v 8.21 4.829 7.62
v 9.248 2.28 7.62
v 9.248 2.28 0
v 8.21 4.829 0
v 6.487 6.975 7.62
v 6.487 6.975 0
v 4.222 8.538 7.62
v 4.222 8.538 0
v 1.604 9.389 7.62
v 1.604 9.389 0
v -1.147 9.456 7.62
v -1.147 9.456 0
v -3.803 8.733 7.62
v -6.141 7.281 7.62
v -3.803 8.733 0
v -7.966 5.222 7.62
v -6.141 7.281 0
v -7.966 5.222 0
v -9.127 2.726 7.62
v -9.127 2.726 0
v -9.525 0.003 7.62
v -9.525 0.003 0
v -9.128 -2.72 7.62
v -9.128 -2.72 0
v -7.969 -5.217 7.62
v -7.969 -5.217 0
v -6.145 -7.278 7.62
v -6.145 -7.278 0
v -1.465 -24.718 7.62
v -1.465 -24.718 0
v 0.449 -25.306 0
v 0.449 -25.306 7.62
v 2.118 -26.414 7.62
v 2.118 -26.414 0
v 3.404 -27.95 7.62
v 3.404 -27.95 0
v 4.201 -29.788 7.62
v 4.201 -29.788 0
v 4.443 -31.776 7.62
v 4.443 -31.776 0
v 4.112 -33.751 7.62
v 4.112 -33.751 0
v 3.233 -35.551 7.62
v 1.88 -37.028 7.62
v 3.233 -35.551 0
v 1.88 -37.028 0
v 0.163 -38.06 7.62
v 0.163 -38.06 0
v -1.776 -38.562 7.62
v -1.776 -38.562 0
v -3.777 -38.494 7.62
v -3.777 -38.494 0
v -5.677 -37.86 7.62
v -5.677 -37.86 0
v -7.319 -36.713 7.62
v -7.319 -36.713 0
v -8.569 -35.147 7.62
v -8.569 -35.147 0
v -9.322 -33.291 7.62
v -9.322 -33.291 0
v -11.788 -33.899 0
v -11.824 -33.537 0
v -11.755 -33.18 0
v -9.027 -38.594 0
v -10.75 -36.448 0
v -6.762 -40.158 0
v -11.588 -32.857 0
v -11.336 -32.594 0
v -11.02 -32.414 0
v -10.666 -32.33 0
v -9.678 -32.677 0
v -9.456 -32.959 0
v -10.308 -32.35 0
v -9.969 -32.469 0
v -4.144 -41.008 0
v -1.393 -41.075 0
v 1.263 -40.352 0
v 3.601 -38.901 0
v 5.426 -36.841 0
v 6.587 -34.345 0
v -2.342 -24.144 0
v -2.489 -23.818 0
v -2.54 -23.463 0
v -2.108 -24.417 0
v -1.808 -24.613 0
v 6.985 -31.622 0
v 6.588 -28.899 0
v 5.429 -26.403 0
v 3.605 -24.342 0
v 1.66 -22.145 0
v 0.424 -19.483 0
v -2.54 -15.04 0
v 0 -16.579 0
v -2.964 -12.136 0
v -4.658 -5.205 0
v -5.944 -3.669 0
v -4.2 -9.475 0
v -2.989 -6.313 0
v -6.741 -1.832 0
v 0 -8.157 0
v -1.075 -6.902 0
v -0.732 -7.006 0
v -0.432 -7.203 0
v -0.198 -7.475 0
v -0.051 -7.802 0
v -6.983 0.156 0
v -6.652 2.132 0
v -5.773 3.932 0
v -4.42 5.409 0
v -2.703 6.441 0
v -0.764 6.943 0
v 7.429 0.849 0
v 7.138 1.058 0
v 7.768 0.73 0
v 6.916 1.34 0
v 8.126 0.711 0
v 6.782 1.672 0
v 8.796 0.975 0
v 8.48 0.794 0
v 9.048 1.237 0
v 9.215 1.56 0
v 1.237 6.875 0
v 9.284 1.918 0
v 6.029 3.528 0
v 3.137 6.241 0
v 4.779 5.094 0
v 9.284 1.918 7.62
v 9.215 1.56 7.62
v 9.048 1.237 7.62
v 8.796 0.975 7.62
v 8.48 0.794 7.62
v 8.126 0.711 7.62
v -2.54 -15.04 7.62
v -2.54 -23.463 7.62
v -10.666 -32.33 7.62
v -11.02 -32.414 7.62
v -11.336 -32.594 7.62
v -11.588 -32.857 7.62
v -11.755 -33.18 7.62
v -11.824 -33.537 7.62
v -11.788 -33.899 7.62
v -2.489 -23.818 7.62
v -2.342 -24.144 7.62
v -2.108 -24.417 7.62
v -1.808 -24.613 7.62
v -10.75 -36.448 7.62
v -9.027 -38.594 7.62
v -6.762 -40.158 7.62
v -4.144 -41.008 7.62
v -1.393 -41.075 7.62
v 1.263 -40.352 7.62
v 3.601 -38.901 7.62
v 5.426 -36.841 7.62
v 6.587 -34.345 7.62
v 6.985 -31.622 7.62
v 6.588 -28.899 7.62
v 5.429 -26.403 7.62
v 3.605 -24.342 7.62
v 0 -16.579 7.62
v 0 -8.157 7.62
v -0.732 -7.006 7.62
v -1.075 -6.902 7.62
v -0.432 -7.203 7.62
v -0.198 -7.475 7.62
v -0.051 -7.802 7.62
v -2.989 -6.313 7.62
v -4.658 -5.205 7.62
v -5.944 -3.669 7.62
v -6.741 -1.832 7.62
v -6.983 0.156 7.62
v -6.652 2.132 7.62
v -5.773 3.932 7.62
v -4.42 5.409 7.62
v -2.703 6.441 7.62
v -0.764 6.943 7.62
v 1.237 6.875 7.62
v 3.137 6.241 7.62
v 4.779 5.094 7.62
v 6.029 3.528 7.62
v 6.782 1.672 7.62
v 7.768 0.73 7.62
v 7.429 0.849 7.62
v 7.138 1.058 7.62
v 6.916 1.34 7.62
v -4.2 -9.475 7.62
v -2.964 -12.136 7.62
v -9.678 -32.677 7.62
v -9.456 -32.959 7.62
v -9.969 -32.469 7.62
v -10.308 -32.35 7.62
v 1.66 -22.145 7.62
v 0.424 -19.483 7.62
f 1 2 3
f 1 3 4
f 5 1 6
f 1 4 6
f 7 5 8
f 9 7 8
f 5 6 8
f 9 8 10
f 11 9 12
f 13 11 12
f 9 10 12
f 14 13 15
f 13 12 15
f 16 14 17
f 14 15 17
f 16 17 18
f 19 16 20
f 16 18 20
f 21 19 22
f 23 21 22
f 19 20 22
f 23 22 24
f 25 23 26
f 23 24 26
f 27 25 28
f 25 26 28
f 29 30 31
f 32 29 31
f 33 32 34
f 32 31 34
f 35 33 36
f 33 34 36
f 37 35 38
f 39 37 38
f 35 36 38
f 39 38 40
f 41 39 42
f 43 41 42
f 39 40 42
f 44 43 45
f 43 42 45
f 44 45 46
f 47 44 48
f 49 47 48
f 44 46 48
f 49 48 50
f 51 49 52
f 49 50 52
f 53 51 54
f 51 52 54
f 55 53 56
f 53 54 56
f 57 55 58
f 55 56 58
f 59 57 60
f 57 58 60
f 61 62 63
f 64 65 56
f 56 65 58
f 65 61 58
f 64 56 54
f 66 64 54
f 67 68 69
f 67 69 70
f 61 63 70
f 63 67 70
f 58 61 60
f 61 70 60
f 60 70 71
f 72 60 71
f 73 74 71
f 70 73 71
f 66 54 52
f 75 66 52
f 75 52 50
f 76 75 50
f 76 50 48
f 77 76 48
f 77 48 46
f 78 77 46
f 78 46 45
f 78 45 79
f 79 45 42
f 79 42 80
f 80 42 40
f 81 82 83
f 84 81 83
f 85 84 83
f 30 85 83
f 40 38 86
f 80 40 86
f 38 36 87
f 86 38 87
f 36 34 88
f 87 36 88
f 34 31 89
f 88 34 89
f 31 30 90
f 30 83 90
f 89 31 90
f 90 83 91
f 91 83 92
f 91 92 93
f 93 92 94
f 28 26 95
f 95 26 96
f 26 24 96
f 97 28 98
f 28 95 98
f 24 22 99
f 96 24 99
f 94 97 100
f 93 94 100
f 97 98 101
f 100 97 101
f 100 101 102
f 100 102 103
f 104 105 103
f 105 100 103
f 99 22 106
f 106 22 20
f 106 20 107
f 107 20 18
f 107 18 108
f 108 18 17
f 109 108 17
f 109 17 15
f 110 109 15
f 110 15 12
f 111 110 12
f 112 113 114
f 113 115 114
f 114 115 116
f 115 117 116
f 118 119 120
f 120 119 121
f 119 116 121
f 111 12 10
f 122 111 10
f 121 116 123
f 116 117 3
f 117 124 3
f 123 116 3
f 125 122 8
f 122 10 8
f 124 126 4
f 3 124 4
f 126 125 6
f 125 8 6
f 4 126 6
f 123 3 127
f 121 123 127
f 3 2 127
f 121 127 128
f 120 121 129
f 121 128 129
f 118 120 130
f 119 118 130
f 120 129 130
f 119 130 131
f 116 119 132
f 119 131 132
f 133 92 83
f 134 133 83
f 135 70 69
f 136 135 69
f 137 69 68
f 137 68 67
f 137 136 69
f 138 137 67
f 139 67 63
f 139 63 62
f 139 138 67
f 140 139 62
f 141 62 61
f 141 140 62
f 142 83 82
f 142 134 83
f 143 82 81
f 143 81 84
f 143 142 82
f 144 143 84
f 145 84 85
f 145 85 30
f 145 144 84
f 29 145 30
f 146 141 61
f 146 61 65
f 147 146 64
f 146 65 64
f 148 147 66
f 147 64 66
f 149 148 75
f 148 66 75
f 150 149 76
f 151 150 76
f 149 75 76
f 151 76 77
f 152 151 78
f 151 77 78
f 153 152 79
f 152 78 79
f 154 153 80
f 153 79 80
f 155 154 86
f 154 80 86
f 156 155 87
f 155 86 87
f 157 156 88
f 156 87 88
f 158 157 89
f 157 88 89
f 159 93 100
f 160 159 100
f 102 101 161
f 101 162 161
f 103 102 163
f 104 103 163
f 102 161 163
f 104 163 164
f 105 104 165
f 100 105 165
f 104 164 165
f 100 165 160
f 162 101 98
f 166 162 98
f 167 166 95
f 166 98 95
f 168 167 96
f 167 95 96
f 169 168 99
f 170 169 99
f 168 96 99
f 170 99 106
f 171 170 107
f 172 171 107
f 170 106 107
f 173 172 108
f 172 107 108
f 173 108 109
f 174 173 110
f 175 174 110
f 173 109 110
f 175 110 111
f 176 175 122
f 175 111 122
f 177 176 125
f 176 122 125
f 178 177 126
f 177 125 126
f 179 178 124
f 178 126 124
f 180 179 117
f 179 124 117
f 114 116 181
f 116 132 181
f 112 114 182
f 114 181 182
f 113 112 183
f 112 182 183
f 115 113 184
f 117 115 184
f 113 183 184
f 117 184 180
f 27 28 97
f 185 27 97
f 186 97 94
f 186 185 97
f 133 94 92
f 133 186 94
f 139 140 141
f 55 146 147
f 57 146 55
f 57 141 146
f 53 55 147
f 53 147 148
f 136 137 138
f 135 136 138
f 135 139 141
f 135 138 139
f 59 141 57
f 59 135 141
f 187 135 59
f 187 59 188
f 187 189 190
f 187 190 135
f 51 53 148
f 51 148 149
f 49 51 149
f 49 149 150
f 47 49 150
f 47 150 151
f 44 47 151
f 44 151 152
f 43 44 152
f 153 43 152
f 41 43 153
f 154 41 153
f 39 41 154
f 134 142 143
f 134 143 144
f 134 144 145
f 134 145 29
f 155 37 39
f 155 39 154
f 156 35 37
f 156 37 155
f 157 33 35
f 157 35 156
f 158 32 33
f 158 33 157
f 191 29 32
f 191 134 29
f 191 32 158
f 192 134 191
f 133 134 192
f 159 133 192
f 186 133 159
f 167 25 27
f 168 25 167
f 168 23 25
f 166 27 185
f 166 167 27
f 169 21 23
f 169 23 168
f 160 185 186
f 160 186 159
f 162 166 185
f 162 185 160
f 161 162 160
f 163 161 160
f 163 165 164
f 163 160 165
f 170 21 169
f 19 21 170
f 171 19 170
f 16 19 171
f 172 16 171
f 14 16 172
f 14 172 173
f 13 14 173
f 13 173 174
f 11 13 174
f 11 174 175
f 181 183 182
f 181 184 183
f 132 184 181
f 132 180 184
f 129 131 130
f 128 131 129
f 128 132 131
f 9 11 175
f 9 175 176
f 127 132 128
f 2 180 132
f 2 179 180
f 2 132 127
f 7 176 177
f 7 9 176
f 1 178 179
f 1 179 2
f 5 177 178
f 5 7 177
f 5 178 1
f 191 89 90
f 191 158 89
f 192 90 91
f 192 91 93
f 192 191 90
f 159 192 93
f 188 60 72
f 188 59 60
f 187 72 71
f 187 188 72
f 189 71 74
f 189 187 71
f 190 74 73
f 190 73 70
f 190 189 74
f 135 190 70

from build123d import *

# Parameters (mm, degrees)
F1_DEPTH = 7.62
F2_R     = 10.16
F3_R     = 1.26999


# Not quite as in the source:
# - a fillet or chamfer is up to 0.001 mm smaller than in the source, because OpenCascade refuses the exact size


with BuildPart() as f1:
    # F0 (on Top) → F1 (new body)
    with BuildSketch(Plane.XY):
        with BuildLine():
            ThreePointArc((0, -6.985), (-5.1498821976, 4.7189976002), (6.9584199662, 0.6087828631))
            Line((6.9584199662, 0.6087828631), (9.4887544993, 0.8301584497))
            ThreePointArc((9.4887544993, 0.8301584497), (-6.0928284325, 7.3214115232), (-2.54, -9.1800885072))
            Line((-2.54, -9.1800885072), (-2.54, -22.0943992214))
            Line((-2.54, -22.0943992214), (-2.54, -24.6343992214))
            ThreePointArc((-2.54, -24.6343992214), (2.6098821976, -36.3383968216), (-9.4984199662, -32.2281820845))
            Line((-9.4984199662, -32.2281820845), (-12.0287544993, -32.4495576711))
            ThreePointArc((-12.0287544993, -32.4495576711), (3.5528284325, -38.9408107447), (0, -22.4393107142))
            Line((0, -22.4393107142), (0, -9.525))
            Line((0, -9.525), (0, -6.985))
        make_face()
    extrude(amount=F1_DEPTH)

    # F2
    f2_edges = [f1.edges().sort_by_distance(p)[0] for p in [
        (-2.54, -9.180089, 3.81),
        (0, -22.439311, 3.81),
    ]]
    fillet(f2_edges, radius=F2_R)

    # F3 (radius 1.27 in the source; OpenCascade refuses exactly that, so slightly less here)
    f3_edges = [f1.edges().sort_by_distance(p)[0] for p in [
        (6.95842, 0.608783, 3.81),
        (9.488754, 0.830158, 3.81),
        (-12.028754, -32.449558, 3.81),
        (-9.49842, -32.228182, 3.81),
        (-2.54, -24.634399, 3.81),
        (0, -6.985, 3.81),
    ]]
    fillet(f3_edges, radius=F3_R)


solid = f1.part
